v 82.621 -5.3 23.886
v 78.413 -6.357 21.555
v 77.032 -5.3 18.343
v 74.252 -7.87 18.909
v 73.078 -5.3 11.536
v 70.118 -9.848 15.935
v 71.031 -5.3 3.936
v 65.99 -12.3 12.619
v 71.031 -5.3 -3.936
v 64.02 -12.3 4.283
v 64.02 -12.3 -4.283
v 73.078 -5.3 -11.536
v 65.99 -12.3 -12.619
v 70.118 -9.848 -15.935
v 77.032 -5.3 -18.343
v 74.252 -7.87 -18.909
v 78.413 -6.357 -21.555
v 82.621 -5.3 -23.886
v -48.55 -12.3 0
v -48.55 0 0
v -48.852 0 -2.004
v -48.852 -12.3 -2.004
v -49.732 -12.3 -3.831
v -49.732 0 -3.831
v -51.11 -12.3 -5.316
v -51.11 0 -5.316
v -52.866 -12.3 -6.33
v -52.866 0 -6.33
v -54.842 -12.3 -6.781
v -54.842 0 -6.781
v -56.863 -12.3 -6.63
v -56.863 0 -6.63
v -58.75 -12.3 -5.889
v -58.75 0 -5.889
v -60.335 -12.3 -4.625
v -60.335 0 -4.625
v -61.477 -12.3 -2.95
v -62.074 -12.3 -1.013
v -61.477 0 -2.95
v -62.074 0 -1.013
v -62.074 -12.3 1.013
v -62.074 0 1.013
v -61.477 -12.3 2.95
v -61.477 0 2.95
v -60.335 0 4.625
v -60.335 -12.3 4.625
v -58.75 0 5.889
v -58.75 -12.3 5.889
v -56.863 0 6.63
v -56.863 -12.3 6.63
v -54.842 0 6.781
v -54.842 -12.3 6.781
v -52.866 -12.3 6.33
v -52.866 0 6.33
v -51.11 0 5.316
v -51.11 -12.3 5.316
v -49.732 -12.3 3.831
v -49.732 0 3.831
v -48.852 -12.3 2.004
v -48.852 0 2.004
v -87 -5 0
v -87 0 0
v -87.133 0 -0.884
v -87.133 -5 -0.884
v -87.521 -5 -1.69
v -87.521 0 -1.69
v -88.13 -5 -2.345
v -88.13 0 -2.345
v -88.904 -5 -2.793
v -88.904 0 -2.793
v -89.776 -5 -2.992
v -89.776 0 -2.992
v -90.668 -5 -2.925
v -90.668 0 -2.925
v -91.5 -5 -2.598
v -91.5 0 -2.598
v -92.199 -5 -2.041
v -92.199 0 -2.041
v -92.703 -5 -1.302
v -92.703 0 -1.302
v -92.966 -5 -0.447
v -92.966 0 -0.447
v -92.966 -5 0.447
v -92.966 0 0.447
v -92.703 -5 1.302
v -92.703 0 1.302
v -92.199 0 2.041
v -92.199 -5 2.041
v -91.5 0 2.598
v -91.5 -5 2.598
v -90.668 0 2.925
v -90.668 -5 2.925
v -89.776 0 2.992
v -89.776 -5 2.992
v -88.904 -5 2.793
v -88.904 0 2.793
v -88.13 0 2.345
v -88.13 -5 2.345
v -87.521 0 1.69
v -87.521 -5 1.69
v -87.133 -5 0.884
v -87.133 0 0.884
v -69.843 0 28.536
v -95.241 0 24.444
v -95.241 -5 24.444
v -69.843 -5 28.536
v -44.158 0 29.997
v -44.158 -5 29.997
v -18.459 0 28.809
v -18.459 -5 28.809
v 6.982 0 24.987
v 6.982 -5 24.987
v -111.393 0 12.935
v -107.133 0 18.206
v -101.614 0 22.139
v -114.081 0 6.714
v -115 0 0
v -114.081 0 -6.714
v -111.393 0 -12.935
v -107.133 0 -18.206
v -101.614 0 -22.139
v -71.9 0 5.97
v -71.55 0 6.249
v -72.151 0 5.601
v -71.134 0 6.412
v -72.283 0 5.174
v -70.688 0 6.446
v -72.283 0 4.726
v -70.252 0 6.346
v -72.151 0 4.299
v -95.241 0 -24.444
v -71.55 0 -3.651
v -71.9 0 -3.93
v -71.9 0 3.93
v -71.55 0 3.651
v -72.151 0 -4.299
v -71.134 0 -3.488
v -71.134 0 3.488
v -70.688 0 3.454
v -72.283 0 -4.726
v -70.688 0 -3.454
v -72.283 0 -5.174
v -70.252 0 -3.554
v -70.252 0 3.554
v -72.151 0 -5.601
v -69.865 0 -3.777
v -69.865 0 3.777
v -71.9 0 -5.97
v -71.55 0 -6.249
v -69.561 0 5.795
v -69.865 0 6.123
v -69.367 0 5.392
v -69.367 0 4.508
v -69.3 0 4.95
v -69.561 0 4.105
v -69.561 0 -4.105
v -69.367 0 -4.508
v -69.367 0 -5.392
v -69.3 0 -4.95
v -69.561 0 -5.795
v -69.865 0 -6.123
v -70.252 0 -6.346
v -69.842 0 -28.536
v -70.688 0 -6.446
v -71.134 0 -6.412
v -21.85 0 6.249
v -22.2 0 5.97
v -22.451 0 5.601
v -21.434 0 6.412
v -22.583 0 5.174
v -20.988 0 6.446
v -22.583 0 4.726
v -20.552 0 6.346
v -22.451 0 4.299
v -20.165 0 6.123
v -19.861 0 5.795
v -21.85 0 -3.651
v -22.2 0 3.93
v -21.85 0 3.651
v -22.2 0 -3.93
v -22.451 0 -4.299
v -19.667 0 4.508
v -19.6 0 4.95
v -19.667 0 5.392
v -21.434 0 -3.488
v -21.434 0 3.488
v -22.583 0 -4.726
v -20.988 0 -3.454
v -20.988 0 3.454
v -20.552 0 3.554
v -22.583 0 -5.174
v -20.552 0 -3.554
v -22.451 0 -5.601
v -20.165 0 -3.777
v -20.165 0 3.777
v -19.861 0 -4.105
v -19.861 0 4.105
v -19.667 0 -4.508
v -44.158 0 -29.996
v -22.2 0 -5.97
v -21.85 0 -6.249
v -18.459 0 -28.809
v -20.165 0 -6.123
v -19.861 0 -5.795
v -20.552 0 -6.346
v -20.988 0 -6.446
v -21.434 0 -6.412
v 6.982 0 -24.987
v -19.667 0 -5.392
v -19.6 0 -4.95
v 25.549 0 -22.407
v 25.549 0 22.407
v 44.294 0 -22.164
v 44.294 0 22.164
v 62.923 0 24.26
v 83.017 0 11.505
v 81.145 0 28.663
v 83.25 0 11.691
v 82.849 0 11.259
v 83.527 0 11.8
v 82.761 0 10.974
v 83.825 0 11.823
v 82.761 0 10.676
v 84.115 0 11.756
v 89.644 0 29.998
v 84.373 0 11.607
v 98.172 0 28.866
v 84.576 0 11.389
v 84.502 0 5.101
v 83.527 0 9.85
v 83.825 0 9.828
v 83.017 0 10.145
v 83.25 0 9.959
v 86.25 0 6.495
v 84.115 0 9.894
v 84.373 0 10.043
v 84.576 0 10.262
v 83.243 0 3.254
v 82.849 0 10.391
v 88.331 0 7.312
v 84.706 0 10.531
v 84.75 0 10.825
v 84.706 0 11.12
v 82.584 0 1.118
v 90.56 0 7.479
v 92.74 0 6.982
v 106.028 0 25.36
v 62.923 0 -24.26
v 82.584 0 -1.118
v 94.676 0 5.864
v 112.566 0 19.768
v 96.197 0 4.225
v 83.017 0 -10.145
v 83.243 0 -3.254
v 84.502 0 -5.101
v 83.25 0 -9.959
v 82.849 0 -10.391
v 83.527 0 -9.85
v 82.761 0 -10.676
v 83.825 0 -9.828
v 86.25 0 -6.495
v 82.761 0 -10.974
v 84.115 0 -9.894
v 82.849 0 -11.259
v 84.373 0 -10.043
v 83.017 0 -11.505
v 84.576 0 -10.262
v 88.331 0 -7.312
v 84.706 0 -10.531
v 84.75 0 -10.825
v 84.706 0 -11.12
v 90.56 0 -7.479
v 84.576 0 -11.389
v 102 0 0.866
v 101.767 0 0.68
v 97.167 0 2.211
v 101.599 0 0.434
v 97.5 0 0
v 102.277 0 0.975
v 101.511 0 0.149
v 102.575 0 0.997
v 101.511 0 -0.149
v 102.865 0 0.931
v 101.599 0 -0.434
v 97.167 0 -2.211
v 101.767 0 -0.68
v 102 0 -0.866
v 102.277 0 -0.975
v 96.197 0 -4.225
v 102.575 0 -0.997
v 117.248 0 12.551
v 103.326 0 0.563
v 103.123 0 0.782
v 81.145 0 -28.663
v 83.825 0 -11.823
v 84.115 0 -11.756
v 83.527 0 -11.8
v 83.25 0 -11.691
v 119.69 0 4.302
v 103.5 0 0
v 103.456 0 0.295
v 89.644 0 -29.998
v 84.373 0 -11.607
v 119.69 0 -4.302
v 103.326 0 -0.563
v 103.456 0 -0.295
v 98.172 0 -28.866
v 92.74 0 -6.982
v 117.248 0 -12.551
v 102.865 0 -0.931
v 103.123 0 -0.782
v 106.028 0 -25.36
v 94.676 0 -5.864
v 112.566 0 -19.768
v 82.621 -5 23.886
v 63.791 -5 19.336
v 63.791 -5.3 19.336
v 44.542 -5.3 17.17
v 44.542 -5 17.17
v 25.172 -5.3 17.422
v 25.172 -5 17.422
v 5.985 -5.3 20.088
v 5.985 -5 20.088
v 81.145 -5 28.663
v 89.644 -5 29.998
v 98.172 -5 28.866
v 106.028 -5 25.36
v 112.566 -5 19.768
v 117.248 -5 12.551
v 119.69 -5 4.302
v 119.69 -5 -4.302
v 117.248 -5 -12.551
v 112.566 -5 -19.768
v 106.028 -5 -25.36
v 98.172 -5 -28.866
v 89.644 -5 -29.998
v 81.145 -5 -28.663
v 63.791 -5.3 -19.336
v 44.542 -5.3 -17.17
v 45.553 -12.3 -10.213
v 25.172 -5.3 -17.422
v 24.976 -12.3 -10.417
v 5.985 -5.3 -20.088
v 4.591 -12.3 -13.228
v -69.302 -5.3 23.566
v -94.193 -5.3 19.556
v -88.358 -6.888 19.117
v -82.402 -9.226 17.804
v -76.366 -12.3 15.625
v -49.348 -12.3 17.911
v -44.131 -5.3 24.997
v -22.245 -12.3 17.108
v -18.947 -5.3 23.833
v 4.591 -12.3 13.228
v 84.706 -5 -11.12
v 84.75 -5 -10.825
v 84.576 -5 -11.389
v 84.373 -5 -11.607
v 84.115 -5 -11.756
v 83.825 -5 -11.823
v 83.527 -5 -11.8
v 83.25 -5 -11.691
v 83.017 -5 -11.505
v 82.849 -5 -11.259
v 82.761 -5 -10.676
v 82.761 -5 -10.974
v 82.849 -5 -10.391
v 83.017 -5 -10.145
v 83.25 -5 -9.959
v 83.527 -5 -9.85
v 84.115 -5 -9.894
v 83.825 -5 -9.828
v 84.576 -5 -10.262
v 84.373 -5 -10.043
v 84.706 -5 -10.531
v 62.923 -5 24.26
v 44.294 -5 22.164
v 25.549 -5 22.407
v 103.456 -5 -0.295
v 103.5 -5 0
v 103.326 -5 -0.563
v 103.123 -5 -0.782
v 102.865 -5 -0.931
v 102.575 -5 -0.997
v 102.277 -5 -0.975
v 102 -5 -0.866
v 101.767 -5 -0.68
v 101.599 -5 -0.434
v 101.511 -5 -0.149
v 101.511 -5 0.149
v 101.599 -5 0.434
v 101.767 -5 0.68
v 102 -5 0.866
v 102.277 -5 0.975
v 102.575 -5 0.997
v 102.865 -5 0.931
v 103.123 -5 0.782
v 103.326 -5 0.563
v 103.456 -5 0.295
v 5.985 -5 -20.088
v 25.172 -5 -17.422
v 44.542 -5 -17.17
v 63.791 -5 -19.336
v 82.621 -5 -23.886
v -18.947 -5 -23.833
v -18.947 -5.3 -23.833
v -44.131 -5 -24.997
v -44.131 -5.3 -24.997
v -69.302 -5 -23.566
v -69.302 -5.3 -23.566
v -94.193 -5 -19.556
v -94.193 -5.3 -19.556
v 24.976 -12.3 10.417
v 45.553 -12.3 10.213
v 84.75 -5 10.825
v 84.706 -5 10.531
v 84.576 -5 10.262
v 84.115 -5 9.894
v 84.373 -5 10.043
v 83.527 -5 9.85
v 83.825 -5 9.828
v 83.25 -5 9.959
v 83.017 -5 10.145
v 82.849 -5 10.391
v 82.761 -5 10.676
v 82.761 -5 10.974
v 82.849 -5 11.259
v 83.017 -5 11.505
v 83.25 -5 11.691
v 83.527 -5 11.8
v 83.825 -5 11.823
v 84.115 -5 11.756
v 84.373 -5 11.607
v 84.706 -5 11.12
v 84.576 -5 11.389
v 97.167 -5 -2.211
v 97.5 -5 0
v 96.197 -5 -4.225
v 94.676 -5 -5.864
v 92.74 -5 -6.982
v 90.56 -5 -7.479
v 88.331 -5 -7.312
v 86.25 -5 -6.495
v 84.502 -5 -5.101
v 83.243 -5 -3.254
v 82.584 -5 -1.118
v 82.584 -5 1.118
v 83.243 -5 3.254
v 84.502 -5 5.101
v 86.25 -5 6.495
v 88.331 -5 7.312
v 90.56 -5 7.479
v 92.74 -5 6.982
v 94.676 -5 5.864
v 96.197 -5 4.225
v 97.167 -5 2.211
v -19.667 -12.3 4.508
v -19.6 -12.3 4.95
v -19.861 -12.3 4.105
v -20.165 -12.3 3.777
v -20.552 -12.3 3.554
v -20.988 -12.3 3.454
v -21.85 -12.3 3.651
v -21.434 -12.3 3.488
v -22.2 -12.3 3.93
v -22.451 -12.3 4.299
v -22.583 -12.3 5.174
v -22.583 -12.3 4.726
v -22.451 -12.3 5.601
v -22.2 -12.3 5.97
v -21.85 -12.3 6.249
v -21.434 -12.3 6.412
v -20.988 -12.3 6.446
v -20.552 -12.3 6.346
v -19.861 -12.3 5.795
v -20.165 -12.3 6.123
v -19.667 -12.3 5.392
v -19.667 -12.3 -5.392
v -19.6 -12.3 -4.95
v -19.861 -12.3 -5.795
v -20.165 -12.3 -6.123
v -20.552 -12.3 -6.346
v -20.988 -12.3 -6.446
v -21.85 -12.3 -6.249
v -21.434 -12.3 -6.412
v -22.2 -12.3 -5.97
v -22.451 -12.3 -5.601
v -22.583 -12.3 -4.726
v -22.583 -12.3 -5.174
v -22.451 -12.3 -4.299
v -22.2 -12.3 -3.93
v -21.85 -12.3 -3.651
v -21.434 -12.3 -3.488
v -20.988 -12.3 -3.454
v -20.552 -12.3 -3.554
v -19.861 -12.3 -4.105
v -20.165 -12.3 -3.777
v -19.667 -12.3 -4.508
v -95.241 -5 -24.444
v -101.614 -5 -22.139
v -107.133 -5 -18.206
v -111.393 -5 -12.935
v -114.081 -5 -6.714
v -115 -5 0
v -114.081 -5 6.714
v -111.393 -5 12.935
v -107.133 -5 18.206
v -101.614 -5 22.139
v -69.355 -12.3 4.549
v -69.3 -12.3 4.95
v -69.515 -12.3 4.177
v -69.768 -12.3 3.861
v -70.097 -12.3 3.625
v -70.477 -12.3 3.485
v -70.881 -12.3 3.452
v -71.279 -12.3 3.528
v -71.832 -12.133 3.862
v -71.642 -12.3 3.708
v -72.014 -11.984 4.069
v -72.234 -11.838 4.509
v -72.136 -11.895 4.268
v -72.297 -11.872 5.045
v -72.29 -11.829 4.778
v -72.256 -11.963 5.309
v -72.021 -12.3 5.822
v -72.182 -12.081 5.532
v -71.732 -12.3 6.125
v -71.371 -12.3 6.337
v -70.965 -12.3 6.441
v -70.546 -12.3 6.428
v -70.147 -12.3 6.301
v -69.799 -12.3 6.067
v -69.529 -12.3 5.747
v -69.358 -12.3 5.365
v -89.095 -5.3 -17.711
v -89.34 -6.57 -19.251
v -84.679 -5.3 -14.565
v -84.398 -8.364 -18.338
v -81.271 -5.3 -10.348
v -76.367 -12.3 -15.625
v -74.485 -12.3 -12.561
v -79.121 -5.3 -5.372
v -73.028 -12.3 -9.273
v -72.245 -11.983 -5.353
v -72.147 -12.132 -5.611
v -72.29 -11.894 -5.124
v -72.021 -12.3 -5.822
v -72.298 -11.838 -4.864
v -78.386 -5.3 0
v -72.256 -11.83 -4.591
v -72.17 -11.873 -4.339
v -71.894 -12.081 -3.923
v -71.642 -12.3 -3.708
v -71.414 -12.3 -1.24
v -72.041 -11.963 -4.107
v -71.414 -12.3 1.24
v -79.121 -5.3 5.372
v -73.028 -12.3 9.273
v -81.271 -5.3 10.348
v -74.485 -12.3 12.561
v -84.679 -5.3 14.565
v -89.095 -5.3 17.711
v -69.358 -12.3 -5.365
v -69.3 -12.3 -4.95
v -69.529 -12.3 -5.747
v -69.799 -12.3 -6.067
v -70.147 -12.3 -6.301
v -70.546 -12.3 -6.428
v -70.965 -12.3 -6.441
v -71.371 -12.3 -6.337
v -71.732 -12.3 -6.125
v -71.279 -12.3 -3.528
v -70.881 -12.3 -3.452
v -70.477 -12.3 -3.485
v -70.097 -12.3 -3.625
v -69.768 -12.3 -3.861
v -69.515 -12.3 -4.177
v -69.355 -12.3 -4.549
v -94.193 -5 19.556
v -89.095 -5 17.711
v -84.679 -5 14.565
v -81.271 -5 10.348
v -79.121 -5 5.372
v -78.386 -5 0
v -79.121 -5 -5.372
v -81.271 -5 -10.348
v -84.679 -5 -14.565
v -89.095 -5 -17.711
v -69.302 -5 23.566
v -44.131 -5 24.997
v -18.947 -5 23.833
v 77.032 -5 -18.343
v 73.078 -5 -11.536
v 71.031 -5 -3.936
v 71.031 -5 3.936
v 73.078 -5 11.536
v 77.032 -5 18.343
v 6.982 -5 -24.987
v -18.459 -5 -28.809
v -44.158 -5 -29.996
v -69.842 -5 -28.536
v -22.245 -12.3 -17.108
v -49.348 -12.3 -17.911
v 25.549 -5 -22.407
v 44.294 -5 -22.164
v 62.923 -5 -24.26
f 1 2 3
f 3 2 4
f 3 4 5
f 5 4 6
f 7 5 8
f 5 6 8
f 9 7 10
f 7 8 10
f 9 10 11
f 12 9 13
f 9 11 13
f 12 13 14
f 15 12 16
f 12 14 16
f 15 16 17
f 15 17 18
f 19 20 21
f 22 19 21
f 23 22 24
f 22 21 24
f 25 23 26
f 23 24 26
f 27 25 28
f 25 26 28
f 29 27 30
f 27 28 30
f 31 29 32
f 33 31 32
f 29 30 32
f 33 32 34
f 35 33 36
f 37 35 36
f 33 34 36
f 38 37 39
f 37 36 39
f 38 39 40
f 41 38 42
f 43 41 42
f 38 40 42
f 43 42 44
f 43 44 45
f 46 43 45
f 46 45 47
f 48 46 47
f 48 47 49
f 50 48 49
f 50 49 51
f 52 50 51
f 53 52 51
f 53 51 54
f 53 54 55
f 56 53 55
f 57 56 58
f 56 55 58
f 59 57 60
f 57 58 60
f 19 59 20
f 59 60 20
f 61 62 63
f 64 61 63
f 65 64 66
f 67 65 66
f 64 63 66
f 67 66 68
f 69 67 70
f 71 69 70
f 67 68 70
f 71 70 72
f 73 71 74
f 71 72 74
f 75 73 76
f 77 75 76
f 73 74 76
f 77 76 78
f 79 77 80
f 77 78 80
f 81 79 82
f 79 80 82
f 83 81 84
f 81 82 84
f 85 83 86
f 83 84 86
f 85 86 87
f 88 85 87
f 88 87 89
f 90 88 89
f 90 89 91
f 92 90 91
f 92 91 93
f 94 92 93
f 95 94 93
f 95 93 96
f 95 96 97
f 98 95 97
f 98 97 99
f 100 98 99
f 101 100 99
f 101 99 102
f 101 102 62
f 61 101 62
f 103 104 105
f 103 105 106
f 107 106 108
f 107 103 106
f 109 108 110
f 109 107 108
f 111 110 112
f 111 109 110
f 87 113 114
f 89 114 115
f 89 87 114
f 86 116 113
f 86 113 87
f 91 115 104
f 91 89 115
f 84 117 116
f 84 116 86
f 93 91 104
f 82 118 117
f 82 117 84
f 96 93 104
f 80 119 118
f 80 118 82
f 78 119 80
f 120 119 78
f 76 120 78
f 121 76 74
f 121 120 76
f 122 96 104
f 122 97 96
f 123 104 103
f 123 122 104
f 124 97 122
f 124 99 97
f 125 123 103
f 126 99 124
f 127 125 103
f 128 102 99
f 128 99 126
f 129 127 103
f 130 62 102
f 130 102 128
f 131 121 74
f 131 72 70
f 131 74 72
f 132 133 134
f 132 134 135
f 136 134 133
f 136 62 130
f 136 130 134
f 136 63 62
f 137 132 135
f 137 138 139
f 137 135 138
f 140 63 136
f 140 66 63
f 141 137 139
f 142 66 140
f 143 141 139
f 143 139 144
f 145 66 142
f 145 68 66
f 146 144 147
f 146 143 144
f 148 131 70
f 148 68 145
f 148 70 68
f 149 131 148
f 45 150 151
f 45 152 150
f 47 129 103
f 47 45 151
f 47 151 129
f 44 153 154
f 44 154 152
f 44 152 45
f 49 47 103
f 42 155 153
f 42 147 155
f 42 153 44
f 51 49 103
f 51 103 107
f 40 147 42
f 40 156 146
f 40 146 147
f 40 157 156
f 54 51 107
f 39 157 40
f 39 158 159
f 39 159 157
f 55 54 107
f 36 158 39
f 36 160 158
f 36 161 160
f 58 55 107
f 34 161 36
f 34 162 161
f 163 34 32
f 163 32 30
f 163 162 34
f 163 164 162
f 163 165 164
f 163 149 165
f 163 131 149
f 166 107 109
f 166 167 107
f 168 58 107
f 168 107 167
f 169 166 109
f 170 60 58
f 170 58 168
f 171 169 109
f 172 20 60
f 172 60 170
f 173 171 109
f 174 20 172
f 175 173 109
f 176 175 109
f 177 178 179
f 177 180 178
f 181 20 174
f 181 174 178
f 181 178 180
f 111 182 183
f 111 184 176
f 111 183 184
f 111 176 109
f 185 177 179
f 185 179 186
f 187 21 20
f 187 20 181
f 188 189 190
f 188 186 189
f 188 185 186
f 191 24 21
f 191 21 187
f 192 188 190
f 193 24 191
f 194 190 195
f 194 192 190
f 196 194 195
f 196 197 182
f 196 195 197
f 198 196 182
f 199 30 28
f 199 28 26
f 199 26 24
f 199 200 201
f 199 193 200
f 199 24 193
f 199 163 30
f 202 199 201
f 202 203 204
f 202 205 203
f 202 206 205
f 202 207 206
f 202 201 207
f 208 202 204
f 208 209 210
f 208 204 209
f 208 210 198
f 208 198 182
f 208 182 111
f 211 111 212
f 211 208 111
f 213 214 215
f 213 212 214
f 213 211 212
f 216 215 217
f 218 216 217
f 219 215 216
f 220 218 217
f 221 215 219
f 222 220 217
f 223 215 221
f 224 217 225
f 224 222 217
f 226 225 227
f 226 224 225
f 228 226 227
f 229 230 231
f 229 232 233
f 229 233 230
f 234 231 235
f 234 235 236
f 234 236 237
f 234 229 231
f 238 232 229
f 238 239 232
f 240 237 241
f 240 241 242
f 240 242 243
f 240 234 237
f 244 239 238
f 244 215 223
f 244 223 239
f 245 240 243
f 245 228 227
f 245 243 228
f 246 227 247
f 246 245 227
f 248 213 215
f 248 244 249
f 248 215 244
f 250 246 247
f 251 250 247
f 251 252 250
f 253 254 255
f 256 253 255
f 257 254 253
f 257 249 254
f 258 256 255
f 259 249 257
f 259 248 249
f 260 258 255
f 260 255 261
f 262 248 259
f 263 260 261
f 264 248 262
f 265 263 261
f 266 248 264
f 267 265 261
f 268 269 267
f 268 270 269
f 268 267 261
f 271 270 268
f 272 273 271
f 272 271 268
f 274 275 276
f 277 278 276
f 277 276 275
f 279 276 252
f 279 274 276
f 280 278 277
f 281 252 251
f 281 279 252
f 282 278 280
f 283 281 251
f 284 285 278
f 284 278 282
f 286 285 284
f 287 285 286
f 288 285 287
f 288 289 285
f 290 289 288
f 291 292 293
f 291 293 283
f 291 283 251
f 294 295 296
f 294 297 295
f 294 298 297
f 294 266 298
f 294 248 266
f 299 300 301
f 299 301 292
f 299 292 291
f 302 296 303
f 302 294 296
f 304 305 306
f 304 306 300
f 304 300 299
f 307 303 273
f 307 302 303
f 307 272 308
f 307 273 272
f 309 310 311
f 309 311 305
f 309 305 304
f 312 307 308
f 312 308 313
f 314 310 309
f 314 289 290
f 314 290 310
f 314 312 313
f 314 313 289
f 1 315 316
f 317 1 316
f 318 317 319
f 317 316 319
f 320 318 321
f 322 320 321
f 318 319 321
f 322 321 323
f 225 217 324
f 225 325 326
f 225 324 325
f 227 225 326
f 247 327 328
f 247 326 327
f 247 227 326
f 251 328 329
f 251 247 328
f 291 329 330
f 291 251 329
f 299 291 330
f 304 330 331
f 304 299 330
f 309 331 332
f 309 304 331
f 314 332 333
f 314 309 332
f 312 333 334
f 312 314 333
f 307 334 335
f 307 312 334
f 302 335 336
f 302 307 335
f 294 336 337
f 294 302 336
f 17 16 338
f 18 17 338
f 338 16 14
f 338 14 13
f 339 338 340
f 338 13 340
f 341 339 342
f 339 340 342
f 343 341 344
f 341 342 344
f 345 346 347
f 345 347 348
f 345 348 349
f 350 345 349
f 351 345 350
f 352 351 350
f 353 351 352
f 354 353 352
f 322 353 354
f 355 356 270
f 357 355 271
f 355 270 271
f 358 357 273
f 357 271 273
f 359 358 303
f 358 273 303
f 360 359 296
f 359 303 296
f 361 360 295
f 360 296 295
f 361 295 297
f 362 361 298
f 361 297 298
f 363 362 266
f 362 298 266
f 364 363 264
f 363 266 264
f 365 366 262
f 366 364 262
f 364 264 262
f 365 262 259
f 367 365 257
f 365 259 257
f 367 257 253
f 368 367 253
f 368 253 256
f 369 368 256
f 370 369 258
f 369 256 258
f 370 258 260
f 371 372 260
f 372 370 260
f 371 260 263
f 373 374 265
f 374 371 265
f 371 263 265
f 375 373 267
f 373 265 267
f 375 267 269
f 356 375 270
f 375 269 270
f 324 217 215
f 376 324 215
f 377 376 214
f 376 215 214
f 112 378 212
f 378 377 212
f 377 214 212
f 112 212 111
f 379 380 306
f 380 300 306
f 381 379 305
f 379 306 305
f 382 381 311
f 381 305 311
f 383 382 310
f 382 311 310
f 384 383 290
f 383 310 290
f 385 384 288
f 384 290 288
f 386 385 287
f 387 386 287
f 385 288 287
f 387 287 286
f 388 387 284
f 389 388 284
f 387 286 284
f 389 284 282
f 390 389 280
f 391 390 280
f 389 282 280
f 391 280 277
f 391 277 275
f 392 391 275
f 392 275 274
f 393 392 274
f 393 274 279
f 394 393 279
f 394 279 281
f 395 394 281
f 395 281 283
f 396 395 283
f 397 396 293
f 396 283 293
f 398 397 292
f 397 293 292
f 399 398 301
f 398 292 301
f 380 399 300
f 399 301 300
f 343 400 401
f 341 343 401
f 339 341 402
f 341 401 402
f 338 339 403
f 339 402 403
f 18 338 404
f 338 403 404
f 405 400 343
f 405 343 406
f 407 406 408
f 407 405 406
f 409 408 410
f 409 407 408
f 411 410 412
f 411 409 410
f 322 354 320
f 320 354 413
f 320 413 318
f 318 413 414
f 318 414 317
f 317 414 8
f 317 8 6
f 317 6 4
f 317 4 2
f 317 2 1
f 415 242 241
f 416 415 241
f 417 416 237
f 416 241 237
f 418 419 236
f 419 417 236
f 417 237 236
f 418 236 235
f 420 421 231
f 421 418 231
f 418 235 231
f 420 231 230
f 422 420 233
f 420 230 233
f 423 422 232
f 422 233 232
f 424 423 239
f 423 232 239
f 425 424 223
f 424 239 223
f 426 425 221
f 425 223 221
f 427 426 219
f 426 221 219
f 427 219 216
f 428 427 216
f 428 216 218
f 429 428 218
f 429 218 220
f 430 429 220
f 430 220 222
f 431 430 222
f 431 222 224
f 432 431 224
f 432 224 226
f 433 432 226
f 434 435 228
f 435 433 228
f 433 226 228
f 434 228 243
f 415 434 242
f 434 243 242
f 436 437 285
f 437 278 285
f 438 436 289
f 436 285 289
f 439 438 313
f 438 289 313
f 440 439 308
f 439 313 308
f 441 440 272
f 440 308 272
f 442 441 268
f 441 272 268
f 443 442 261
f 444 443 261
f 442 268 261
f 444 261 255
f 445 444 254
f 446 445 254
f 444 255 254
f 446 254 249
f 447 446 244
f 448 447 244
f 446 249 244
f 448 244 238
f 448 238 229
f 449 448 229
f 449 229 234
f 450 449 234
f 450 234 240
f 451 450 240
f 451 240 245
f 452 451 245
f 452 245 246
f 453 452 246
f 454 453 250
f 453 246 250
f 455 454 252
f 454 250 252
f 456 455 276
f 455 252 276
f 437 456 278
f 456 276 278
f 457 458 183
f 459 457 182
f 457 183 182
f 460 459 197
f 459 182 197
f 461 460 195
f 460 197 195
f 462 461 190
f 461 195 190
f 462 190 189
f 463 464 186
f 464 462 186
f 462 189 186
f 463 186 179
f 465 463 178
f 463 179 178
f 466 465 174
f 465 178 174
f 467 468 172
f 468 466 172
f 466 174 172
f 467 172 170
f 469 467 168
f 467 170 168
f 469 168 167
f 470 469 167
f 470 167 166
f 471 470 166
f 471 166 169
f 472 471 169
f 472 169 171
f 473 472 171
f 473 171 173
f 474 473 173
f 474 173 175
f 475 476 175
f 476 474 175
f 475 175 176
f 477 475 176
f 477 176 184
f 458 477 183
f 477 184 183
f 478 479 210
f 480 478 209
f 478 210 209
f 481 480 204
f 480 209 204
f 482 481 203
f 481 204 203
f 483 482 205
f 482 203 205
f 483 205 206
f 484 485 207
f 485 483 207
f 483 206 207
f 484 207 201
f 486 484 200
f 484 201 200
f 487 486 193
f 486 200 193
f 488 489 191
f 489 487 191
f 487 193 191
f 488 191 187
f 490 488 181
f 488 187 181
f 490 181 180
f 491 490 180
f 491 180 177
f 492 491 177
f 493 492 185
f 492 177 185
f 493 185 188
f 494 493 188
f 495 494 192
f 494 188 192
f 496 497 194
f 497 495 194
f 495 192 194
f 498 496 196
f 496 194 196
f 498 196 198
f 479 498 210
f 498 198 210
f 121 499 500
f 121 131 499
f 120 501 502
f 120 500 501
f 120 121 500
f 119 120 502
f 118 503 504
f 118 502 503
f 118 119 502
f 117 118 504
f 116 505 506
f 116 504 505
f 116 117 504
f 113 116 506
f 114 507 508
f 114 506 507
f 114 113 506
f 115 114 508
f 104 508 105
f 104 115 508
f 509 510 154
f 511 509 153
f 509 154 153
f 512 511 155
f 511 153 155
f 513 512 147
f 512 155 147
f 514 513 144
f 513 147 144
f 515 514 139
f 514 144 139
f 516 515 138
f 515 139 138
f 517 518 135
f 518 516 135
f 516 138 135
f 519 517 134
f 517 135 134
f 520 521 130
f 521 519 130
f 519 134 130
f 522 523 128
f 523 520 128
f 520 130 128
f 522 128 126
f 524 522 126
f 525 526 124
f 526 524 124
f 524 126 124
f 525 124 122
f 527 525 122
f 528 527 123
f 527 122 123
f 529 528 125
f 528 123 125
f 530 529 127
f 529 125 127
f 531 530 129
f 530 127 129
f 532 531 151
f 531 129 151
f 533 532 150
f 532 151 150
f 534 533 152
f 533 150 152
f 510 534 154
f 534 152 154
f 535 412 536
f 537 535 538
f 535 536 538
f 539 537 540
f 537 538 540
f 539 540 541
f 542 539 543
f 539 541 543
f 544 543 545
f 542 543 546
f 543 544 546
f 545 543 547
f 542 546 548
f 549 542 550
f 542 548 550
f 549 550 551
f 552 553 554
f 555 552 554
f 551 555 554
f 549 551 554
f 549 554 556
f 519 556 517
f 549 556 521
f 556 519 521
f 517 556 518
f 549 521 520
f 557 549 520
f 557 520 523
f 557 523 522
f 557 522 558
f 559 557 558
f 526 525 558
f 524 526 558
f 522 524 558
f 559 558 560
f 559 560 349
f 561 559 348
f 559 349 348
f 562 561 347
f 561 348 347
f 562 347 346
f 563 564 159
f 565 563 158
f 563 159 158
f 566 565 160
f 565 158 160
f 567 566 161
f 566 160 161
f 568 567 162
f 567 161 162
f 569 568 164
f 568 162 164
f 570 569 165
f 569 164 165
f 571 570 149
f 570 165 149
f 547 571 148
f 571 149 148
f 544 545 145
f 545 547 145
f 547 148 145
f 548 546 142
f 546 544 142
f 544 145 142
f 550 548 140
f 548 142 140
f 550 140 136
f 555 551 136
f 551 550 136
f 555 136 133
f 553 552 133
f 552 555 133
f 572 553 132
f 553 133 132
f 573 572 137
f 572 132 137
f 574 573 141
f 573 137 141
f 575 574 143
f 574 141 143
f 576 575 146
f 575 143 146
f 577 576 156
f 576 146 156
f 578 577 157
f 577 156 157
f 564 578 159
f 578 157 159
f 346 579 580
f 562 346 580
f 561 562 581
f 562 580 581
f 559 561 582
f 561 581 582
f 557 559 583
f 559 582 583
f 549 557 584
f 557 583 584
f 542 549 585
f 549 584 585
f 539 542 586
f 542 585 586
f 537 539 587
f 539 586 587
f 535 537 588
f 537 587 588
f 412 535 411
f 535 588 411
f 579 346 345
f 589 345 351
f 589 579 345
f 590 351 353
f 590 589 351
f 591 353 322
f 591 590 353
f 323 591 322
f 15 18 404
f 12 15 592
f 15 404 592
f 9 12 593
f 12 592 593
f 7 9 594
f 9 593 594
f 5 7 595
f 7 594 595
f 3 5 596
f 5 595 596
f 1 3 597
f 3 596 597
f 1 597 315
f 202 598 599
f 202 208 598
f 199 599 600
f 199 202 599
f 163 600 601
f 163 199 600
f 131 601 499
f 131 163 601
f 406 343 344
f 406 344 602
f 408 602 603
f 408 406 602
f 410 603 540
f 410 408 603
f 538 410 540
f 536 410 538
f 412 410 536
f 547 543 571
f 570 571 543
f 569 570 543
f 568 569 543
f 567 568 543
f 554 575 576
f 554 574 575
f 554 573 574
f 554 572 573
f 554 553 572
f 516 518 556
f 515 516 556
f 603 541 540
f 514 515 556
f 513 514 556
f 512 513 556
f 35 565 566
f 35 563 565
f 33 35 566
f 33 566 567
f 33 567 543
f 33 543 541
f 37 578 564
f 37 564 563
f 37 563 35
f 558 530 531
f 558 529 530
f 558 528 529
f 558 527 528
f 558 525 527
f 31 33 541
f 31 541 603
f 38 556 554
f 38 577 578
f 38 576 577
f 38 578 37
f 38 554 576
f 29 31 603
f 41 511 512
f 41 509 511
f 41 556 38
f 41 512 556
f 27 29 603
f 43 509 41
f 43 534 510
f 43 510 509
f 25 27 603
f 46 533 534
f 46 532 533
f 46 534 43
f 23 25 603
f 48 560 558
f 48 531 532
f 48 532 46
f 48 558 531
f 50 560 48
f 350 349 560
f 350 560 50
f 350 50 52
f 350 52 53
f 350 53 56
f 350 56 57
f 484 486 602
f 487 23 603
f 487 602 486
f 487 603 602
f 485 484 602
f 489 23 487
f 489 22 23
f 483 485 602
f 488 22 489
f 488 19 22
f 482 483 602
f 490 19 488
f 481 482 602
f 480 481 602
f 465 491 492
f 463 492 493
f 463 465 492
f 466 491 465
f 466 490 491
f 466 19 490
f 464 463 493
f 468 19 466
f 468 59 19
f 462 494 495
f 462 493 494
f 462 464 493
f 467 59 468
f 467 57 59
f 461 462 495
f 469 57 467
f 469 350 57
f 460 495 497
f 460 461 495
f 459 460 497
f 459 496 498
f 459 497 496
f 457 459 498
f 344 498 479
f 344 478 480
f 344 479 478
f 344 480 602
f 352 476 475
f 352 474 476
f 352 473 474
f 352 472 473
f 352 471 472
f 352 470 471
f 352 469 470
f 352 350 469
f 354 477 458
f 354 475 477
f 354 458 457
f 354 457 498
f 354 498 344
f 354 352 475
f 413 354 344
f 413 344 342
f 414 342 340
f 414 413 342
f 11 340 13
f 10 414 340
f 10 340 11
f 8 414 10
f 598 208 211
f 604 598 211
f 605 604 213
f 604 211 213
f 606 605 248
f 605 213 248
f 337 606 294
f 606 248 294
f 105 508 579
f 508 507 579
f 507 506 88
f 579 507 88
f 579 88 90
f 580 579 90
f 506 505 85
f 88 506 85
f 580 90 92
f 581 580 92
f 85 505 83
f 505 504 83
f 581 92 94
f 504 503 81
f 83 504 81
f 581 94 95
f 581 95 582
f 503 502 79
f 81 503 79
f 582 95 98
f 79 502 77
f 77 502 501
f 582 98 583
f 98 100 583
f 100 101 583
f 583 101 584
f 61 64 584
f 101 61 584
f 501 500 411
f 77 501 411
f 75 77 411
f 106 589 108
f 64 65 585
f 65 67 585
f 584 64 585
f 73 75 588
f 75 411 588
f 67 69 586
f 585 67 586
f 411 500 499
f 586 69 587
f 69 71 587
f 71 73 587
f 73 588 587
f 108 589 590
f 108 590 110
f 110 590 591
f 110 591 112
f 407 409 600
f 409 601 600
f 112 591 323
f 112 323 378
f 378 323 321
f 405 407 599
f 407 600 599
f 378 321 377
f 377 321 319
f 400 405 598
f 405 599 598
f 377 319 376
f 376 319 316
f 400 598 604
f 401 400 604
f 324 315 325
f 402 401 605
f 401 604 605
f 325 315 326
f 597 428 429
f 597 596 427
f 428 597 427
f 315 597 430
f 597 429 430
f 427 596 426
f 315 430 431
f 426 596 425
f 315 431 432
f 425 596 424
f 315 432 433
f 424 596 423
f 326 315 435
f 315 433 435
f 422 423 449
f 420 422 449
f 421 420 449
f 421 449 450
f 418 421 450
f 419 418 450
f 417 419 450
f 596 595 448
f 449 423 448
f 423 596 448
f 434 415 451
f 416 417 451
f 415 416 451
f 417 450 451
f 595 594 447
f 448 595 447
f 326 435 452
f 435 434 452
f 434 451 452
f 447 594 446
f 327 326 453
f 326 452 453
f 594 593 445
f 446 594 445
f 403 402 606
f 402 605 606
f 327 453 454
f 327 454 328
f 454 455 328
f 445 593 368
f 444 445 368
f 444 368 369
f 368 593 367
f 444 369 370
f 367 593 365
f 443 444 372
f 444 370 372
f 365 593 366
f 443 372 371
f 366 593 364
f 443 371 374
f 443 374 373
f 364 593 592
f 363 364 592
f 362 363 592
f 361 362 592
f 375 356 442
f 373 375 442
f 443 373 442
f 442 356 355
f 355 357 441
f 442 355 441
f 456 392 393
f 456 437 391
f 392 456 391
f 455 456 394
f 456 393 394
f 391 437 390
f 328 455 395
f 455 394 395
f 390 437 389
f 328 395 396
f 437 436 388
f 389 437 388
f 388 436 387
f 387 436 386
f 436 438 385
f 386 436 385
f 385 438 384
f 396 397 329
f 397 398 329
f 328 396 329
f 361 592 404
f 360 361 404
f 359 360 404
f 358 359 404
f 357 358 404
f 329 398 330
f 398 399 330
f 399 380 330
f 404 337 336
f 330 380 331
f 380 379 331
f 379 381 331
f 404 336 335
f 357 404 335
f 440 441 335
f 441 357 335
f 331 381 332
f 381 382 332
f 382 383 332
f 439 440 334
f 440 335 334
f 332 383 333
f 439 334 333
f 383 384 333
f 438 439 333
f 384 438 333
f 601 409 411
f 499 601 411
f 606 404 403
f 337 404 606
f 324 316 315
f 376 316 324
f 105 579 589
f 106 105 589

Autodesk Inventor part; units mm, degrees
ref_plane "YZ Plane" through (0, 0, 0) normal (1, 0, 0) x (0, 1, 0)
ref_plane "XZ Plane" through (0, 0, 0) normal (0, 1, 0) x (-1, 0, 0)
ref_plane "XY Plane" through (0, 0, 0) normal (0, 0, 1) x (1, 0, 0)
sketch "Sketch1" plane through (0, 0, 0) normal (0, 1, 0) x (-1, 0, 0)
  line L0 (-90, -25) -> (90, -25)
  line L1 (90, -25) -> (90, 25)
  line L2 (90, 25) -> (-90, 25)
  line L3 (-90, 25) -> (-90, -25)
  line L4 (-90, -25) -> (90, 25) construction
  line L5 (90, -25) -> (-90, 25) construction
  circle A0 centre (90, 0) radius 25
  circle A1 centre (-90, 0) radius 25
  point P0 (0, 0)
  dimension "d0" = 180
  dimension "d1" = 50
extrude "Extrusion1" add sketch "Sketch1" along normal blind 5
sketch "Sketch2" plane through (0, 5, 0) normal (0, 1, 0) x (1, 0, 0)
  arc A0 (90, -25) -> (90, 25) centre (90, 0) ccw projected
  arc A1 (-90, 25) -> (-90, -25) centre (-90, 0) ccw projected
  circle A2 centre (-90, 0) radius 7.5
  circle A3 centre (90, 0) radius 7.5
  point P0 (0, 0)
  dimension "d4" = 15
  dimension "d5" = 15
extrude "Extrusion2" cut sketch "Sketch2" against normal blind 5
sketch "Sketch3" plane through (0, 0, 0) normal (0, -1, 0) x (1, 0, 0)
  line L0 (-90, 25) -> (90, 25) projected
  arc A0 (-90, 25) -> (-90, -25) centre (-90, 0) ccw projected
  line L1 (-90, 0) -> (-55.35, 0)
  circle A1 centre (-55.35, 0) radius 17.325
  line L2 (-55.35, 0) -> (-73.45, 0)
  line L3 (-73.45, 0) -> (-18.45, 0)
  line L4 (-18.45, 10) -> (-73.45, 10)
  line L5 (-73.45, 10) -> (-73.45, -10)
  line L6 (-73.45, -10) -> (-18.45, -10)
  line L7 (-18.45, -10) -> (-18.45, 10)
  line L8 (-18.45, 10) -> (-73.45, -10) construction
  line L9 (-73.45, 10) -> (-18.45, -10) construction
  line L10 (-25.85, -10) -> (-25.85, 10)
  line L11 (-25.85, 10) -> (-66.05, -10) construction
  line L12 (-66.05, 10) -> (-25.85, -10) construction
  line L13 (-70.8, 4.95) -> (-70.8, -4.95)
  line L14 (-70.8, -4.95) -> (-61.3, -4.95)
  line L15 (-61.3, -4.95) -> (-61.3, 4.95)
  line L16 (-61.3, 4.95) -> (-70.8, -4.95) construction
  line L17 (-70.8, 4.95) -> (-61.3, -4.95) construction
  line L18 (-21.1, 4.95) -> (-30.6, 4.95)
  line L19 (-30.6, 4.95) -> (-30.6, -4.95)
  line L20 (-30.6, -4.95) -> (-21.1, -4.95)
  line L21 (-21.1, -4.95) -> (-21.1, 4.95)
  line L22 (-21.1, 4.95) -> (-30.6, -4.95) construction
  line L23 (-30.6, 4.95) -> (-21.1, -4.95) construction
  circle A2 centre (-70.8, 4.95) radius 1.5
  circle A3 centre (-70.8, -4.95) radius 1.5
  circle A4 centre (-21.1, -4.95) radius 1.5
  circle A5 centre (-21.1, 4.95) radius 1.5
  circle A6 centre (-55.35, 0) radius 6.8
  point P0 (0, 0)
  point P1 (-45.95, 0)
  point P2 (-45.95, 0)
  point P3 (-66.05, 0)
  point P4 (-25.85, 0)
  dimension "d9" = 34.65
  dimension "d10" = 18.1
  dimension "d11" = 55
  dimension "d12" = 20
  dimension "d13" = 40.2
  dimension "d14" = 9.5
  dimension "d15" = 9.9
  dimension "d16" = 9.5
  dimension "d17" = 9.9
  dimension "d18" = 3
  dimension "d19" = 3
  dimension "d20" = 3
  dimension "d21" = 3
  dimension "d22" = 13.6
extrude "Extrusion3" cut sketch "Sketch3" against normal blind 5 contours A2 A1 | A1 A2 | A3 L13 L14 A1 | A1 A3 | A6 L15 L1 | L1 L15 A6 | A3 L14 L13 | L15 A6 L3 L1 | L1 L3 A6 L15 | A5 L21 L18 | L18 L21 A5 | A4 L21 L20 | L20 L21 A4
sketch "Sketch4" plane through (0, 0, 0) normal (0, -1, 0) x (1, 0, 0)
  circle A0 centre (90, 0) radius 7.5 projected
  arc A1 (90, -25) -> (90, 25) centre (90, 0) ccw projected
  line L0 (-90, 25) -> (90, 25) projected
  circle A2 centre (90, 0) radius 17.5
  line L1 (82.5, 0) -> (72.5, 0)
  line L2 (97.5, 0) -> (107.5, 0)
  circle A3 centre (102.5, 0) radius 1
  line L3 (90, 0) -> (107.5, 0) construction
  line L4 (90, 0) -> (81.25, -15.1554)
  line L5 (90, 0) -> (107.5, 0) construction
  circle A4 centre (83.75, 10.8253) radius 1
  circle A5 centre (83.75, -10.8253) radius 1
  point P0 (0, 0)
  dimension "d26" = 2
  dimension "d29" = 2
  dimension "d30" = 2
extrude "Extrusion4" cut sketch "Sketch4" against normal blind 5 contours A3 L2 | L2 A3 | A5 L4 | L4 A5 | A4
sketch "Sketch5" plane through (0, 0, 0) normal (0, -1, 0) x (1, 0, 0)
  circle A0 centre (83.75, 10.8253) radius 1 projected
  circle A1 centre (102.5, 0) radius 1 projected
  circle A2 centre (83.75, -10.8253) radius 1 projected
  circle A3 centre (-21.1, 4.95) radius 1.5 projected
  circle A4 centre (-70.8, -4.95) radius 1.5 projected
  circle A5 centre (-55.35, 0) radius 6.8 projected
  circle A6 centre (-70.8, 4.95) radius 1.5 projected
  circle A7 centre (-21.1, -4.95) radius 1.5 projected
  circle A8 centre (-90, 0) radius 7.5 projected
  circle A9 centre (90, 0) radius 7.5 projected
  line L0 (-55.35, 0) -> (0, 0)
  arc A10 (6.9815, 24.9874) -> (-95.2411, 24.4444) centre (-42.8301, -220) ccw
  arc A11 (6.9815, 24.9874) -> (81.1447, 28.6633) centre (36.8685, 171.9798) ccw
  line L1 (-115, 0) -> (115, 0)
  arc A12 (-95.2411, -24.4444) -> (6.9815, -24.9874) centre (-42.8301, 220) ccw
  arc A13 (81.1447, -28.6633) -> (6.9815, -24.9874) centre (36.8685, -171.9798) ccw
  arc A14 (-95.2411, 24.4444) -> (-95.2411, -24.4444) centre (-90, 0) ccw
  arc A15 (81.1447, -28.6633) -> (81.1447, 28.6633) centre (90, 0) ccw construction
  arc A16 (-95.2411, 24.4444) -> (-95.2411, -24.4444) centre (-90, 0) ccw
  arc A17 (81.1447, -28.6633) -> (81.1447, 28.6633) centre (90, 0) ccw
extrude "Extrusion5" add sketch "Sketch5" along normal blind 5
sketch "Sketch6" plane through (0, 5, 0) normal (0, 1, 0) x (1, 0, 0)
  circle A0 centre (83.75, -10.8253) radius 1 projected
  circle A1 centre (102.5, 0) radius 1 projected
  circle A2 centre (83.75, 10.8253) radius 1 projected
  circle A3 centre (-21.1, -4.95) radius 1.5 projected
  circle A4 centre (-70.8, 4.95) radius 1.5 projected
  circle A5 centre (-55.35, 0) radius 6.8 projected
  circle A6 centre (-70.8, -4.95) radius 1.5 projected
  circle A7 centre (-21.1, 4.95) radius 1.5 projected
  circle A8 centre (-90, 0) radius 7.5 projected
  circle A9 centre (90, 0) radius 7.5 projected
  line L0 (-90, -25) -> (90, -25) projected
  arc A10 (90, -25) -> (90, 25) centre (90, 0) ccw projected
  line L1 (90, 25) -> (-90, 25) projected
  arc A11 (-90, 25) -> (-90, -25) centre (-90, 0) ccw projected
  point P0 (0, 0)
extrude "Extrusion6" cut sketch "Sketch6" against normal blind 5
sketch "Sketch8" plane through (0, -5, 0) normal (0, -1, 0) x (1, 0, 0)
  circle A0 centre (-55.35, 0) radius 6.8 projected
  circle A1 centre (-21.1, -4.95) radius 1.5 projected
  circle A2 centre (-70.8, 4.95) radius 1.5 projected
  circle A3 centre (-70.8, -4.95) radius 1.5 projected
  circle A4 centre (-21.1, 4.95) radius 1.5 projected
  arc A5 (-95.2411, 24.4444) -> (-95.2411, -24.4444) centre (-90, 0) ccw projected
  arc A6 (81.1447, -28.6633) -> (81.1447, 28.6633) centre (90, 0) ccw projected
  arc A7 (5.9853, 20.0876) -> (-94.1929, 19.5556) centre (-42.8301, -220) ccw
  arc A8 (5.9853, 20.0876) -> (82.6206, 23.8861) centre (36.8685, 171.9798) ccw
  line L0 (-90, 0) -> (90, 0)
  arc A9 (-94.1929, -19.5556) -> (5.9853, -20.0876) centre (-42.8301, 220) ccw
  arc A10 (82.6206, -23.8861) -> (5.9853, -20.0876) centre (36.8685, -171.9798) ccw
  arc A11 (-94.1929, -19.5556) -> (-94.1929, 19.5556) centre (-98.3858, 0) ccw
  arc A12 (82.6206, 23.8861) -> (82.6206, -23.8861) centre (100.7715, 0) ccw
  point P0 (0, 0)
  dimension "d72" = 20
  dimension "d73" = 30
extrude "Extrusion7" add sketch "Sketch8" along normal blind 7.3 contours L0 A12 A10 A9 A11 A0 | A0 L0 A11 A7 A8 A12
sketch "Sketch14" plane through (0, 0, 0) normal (0, 1, 0) x (1, 0, 0)
  circle A0 centre (-90, 0) radius 7.5 projected
  arc A1 (-95.2411, 24.4444) -> (-95.2411, -24.4444) centre (-90, 0) ccw projected
  circle A2 centre (-90, 0) radius 3
  point P0 (0, 0)
  dimension "d103" = 6
extrude "Extrusion13" add sketch "Sketch14" against normal blind 5
chamfer "Chamfer2" distance 7 angle 45 6 edges at (-44.1313, -12.3, 24.9965) (44.5417, -12.3, 17.1698) (70.7715, -12.3, 0) (44.5417, -12.3, -17.1698) (-44.1313, -12.3, -24.9965) (-78.3858, -12.3, 0)
properties part number "rameno(b)dole"
